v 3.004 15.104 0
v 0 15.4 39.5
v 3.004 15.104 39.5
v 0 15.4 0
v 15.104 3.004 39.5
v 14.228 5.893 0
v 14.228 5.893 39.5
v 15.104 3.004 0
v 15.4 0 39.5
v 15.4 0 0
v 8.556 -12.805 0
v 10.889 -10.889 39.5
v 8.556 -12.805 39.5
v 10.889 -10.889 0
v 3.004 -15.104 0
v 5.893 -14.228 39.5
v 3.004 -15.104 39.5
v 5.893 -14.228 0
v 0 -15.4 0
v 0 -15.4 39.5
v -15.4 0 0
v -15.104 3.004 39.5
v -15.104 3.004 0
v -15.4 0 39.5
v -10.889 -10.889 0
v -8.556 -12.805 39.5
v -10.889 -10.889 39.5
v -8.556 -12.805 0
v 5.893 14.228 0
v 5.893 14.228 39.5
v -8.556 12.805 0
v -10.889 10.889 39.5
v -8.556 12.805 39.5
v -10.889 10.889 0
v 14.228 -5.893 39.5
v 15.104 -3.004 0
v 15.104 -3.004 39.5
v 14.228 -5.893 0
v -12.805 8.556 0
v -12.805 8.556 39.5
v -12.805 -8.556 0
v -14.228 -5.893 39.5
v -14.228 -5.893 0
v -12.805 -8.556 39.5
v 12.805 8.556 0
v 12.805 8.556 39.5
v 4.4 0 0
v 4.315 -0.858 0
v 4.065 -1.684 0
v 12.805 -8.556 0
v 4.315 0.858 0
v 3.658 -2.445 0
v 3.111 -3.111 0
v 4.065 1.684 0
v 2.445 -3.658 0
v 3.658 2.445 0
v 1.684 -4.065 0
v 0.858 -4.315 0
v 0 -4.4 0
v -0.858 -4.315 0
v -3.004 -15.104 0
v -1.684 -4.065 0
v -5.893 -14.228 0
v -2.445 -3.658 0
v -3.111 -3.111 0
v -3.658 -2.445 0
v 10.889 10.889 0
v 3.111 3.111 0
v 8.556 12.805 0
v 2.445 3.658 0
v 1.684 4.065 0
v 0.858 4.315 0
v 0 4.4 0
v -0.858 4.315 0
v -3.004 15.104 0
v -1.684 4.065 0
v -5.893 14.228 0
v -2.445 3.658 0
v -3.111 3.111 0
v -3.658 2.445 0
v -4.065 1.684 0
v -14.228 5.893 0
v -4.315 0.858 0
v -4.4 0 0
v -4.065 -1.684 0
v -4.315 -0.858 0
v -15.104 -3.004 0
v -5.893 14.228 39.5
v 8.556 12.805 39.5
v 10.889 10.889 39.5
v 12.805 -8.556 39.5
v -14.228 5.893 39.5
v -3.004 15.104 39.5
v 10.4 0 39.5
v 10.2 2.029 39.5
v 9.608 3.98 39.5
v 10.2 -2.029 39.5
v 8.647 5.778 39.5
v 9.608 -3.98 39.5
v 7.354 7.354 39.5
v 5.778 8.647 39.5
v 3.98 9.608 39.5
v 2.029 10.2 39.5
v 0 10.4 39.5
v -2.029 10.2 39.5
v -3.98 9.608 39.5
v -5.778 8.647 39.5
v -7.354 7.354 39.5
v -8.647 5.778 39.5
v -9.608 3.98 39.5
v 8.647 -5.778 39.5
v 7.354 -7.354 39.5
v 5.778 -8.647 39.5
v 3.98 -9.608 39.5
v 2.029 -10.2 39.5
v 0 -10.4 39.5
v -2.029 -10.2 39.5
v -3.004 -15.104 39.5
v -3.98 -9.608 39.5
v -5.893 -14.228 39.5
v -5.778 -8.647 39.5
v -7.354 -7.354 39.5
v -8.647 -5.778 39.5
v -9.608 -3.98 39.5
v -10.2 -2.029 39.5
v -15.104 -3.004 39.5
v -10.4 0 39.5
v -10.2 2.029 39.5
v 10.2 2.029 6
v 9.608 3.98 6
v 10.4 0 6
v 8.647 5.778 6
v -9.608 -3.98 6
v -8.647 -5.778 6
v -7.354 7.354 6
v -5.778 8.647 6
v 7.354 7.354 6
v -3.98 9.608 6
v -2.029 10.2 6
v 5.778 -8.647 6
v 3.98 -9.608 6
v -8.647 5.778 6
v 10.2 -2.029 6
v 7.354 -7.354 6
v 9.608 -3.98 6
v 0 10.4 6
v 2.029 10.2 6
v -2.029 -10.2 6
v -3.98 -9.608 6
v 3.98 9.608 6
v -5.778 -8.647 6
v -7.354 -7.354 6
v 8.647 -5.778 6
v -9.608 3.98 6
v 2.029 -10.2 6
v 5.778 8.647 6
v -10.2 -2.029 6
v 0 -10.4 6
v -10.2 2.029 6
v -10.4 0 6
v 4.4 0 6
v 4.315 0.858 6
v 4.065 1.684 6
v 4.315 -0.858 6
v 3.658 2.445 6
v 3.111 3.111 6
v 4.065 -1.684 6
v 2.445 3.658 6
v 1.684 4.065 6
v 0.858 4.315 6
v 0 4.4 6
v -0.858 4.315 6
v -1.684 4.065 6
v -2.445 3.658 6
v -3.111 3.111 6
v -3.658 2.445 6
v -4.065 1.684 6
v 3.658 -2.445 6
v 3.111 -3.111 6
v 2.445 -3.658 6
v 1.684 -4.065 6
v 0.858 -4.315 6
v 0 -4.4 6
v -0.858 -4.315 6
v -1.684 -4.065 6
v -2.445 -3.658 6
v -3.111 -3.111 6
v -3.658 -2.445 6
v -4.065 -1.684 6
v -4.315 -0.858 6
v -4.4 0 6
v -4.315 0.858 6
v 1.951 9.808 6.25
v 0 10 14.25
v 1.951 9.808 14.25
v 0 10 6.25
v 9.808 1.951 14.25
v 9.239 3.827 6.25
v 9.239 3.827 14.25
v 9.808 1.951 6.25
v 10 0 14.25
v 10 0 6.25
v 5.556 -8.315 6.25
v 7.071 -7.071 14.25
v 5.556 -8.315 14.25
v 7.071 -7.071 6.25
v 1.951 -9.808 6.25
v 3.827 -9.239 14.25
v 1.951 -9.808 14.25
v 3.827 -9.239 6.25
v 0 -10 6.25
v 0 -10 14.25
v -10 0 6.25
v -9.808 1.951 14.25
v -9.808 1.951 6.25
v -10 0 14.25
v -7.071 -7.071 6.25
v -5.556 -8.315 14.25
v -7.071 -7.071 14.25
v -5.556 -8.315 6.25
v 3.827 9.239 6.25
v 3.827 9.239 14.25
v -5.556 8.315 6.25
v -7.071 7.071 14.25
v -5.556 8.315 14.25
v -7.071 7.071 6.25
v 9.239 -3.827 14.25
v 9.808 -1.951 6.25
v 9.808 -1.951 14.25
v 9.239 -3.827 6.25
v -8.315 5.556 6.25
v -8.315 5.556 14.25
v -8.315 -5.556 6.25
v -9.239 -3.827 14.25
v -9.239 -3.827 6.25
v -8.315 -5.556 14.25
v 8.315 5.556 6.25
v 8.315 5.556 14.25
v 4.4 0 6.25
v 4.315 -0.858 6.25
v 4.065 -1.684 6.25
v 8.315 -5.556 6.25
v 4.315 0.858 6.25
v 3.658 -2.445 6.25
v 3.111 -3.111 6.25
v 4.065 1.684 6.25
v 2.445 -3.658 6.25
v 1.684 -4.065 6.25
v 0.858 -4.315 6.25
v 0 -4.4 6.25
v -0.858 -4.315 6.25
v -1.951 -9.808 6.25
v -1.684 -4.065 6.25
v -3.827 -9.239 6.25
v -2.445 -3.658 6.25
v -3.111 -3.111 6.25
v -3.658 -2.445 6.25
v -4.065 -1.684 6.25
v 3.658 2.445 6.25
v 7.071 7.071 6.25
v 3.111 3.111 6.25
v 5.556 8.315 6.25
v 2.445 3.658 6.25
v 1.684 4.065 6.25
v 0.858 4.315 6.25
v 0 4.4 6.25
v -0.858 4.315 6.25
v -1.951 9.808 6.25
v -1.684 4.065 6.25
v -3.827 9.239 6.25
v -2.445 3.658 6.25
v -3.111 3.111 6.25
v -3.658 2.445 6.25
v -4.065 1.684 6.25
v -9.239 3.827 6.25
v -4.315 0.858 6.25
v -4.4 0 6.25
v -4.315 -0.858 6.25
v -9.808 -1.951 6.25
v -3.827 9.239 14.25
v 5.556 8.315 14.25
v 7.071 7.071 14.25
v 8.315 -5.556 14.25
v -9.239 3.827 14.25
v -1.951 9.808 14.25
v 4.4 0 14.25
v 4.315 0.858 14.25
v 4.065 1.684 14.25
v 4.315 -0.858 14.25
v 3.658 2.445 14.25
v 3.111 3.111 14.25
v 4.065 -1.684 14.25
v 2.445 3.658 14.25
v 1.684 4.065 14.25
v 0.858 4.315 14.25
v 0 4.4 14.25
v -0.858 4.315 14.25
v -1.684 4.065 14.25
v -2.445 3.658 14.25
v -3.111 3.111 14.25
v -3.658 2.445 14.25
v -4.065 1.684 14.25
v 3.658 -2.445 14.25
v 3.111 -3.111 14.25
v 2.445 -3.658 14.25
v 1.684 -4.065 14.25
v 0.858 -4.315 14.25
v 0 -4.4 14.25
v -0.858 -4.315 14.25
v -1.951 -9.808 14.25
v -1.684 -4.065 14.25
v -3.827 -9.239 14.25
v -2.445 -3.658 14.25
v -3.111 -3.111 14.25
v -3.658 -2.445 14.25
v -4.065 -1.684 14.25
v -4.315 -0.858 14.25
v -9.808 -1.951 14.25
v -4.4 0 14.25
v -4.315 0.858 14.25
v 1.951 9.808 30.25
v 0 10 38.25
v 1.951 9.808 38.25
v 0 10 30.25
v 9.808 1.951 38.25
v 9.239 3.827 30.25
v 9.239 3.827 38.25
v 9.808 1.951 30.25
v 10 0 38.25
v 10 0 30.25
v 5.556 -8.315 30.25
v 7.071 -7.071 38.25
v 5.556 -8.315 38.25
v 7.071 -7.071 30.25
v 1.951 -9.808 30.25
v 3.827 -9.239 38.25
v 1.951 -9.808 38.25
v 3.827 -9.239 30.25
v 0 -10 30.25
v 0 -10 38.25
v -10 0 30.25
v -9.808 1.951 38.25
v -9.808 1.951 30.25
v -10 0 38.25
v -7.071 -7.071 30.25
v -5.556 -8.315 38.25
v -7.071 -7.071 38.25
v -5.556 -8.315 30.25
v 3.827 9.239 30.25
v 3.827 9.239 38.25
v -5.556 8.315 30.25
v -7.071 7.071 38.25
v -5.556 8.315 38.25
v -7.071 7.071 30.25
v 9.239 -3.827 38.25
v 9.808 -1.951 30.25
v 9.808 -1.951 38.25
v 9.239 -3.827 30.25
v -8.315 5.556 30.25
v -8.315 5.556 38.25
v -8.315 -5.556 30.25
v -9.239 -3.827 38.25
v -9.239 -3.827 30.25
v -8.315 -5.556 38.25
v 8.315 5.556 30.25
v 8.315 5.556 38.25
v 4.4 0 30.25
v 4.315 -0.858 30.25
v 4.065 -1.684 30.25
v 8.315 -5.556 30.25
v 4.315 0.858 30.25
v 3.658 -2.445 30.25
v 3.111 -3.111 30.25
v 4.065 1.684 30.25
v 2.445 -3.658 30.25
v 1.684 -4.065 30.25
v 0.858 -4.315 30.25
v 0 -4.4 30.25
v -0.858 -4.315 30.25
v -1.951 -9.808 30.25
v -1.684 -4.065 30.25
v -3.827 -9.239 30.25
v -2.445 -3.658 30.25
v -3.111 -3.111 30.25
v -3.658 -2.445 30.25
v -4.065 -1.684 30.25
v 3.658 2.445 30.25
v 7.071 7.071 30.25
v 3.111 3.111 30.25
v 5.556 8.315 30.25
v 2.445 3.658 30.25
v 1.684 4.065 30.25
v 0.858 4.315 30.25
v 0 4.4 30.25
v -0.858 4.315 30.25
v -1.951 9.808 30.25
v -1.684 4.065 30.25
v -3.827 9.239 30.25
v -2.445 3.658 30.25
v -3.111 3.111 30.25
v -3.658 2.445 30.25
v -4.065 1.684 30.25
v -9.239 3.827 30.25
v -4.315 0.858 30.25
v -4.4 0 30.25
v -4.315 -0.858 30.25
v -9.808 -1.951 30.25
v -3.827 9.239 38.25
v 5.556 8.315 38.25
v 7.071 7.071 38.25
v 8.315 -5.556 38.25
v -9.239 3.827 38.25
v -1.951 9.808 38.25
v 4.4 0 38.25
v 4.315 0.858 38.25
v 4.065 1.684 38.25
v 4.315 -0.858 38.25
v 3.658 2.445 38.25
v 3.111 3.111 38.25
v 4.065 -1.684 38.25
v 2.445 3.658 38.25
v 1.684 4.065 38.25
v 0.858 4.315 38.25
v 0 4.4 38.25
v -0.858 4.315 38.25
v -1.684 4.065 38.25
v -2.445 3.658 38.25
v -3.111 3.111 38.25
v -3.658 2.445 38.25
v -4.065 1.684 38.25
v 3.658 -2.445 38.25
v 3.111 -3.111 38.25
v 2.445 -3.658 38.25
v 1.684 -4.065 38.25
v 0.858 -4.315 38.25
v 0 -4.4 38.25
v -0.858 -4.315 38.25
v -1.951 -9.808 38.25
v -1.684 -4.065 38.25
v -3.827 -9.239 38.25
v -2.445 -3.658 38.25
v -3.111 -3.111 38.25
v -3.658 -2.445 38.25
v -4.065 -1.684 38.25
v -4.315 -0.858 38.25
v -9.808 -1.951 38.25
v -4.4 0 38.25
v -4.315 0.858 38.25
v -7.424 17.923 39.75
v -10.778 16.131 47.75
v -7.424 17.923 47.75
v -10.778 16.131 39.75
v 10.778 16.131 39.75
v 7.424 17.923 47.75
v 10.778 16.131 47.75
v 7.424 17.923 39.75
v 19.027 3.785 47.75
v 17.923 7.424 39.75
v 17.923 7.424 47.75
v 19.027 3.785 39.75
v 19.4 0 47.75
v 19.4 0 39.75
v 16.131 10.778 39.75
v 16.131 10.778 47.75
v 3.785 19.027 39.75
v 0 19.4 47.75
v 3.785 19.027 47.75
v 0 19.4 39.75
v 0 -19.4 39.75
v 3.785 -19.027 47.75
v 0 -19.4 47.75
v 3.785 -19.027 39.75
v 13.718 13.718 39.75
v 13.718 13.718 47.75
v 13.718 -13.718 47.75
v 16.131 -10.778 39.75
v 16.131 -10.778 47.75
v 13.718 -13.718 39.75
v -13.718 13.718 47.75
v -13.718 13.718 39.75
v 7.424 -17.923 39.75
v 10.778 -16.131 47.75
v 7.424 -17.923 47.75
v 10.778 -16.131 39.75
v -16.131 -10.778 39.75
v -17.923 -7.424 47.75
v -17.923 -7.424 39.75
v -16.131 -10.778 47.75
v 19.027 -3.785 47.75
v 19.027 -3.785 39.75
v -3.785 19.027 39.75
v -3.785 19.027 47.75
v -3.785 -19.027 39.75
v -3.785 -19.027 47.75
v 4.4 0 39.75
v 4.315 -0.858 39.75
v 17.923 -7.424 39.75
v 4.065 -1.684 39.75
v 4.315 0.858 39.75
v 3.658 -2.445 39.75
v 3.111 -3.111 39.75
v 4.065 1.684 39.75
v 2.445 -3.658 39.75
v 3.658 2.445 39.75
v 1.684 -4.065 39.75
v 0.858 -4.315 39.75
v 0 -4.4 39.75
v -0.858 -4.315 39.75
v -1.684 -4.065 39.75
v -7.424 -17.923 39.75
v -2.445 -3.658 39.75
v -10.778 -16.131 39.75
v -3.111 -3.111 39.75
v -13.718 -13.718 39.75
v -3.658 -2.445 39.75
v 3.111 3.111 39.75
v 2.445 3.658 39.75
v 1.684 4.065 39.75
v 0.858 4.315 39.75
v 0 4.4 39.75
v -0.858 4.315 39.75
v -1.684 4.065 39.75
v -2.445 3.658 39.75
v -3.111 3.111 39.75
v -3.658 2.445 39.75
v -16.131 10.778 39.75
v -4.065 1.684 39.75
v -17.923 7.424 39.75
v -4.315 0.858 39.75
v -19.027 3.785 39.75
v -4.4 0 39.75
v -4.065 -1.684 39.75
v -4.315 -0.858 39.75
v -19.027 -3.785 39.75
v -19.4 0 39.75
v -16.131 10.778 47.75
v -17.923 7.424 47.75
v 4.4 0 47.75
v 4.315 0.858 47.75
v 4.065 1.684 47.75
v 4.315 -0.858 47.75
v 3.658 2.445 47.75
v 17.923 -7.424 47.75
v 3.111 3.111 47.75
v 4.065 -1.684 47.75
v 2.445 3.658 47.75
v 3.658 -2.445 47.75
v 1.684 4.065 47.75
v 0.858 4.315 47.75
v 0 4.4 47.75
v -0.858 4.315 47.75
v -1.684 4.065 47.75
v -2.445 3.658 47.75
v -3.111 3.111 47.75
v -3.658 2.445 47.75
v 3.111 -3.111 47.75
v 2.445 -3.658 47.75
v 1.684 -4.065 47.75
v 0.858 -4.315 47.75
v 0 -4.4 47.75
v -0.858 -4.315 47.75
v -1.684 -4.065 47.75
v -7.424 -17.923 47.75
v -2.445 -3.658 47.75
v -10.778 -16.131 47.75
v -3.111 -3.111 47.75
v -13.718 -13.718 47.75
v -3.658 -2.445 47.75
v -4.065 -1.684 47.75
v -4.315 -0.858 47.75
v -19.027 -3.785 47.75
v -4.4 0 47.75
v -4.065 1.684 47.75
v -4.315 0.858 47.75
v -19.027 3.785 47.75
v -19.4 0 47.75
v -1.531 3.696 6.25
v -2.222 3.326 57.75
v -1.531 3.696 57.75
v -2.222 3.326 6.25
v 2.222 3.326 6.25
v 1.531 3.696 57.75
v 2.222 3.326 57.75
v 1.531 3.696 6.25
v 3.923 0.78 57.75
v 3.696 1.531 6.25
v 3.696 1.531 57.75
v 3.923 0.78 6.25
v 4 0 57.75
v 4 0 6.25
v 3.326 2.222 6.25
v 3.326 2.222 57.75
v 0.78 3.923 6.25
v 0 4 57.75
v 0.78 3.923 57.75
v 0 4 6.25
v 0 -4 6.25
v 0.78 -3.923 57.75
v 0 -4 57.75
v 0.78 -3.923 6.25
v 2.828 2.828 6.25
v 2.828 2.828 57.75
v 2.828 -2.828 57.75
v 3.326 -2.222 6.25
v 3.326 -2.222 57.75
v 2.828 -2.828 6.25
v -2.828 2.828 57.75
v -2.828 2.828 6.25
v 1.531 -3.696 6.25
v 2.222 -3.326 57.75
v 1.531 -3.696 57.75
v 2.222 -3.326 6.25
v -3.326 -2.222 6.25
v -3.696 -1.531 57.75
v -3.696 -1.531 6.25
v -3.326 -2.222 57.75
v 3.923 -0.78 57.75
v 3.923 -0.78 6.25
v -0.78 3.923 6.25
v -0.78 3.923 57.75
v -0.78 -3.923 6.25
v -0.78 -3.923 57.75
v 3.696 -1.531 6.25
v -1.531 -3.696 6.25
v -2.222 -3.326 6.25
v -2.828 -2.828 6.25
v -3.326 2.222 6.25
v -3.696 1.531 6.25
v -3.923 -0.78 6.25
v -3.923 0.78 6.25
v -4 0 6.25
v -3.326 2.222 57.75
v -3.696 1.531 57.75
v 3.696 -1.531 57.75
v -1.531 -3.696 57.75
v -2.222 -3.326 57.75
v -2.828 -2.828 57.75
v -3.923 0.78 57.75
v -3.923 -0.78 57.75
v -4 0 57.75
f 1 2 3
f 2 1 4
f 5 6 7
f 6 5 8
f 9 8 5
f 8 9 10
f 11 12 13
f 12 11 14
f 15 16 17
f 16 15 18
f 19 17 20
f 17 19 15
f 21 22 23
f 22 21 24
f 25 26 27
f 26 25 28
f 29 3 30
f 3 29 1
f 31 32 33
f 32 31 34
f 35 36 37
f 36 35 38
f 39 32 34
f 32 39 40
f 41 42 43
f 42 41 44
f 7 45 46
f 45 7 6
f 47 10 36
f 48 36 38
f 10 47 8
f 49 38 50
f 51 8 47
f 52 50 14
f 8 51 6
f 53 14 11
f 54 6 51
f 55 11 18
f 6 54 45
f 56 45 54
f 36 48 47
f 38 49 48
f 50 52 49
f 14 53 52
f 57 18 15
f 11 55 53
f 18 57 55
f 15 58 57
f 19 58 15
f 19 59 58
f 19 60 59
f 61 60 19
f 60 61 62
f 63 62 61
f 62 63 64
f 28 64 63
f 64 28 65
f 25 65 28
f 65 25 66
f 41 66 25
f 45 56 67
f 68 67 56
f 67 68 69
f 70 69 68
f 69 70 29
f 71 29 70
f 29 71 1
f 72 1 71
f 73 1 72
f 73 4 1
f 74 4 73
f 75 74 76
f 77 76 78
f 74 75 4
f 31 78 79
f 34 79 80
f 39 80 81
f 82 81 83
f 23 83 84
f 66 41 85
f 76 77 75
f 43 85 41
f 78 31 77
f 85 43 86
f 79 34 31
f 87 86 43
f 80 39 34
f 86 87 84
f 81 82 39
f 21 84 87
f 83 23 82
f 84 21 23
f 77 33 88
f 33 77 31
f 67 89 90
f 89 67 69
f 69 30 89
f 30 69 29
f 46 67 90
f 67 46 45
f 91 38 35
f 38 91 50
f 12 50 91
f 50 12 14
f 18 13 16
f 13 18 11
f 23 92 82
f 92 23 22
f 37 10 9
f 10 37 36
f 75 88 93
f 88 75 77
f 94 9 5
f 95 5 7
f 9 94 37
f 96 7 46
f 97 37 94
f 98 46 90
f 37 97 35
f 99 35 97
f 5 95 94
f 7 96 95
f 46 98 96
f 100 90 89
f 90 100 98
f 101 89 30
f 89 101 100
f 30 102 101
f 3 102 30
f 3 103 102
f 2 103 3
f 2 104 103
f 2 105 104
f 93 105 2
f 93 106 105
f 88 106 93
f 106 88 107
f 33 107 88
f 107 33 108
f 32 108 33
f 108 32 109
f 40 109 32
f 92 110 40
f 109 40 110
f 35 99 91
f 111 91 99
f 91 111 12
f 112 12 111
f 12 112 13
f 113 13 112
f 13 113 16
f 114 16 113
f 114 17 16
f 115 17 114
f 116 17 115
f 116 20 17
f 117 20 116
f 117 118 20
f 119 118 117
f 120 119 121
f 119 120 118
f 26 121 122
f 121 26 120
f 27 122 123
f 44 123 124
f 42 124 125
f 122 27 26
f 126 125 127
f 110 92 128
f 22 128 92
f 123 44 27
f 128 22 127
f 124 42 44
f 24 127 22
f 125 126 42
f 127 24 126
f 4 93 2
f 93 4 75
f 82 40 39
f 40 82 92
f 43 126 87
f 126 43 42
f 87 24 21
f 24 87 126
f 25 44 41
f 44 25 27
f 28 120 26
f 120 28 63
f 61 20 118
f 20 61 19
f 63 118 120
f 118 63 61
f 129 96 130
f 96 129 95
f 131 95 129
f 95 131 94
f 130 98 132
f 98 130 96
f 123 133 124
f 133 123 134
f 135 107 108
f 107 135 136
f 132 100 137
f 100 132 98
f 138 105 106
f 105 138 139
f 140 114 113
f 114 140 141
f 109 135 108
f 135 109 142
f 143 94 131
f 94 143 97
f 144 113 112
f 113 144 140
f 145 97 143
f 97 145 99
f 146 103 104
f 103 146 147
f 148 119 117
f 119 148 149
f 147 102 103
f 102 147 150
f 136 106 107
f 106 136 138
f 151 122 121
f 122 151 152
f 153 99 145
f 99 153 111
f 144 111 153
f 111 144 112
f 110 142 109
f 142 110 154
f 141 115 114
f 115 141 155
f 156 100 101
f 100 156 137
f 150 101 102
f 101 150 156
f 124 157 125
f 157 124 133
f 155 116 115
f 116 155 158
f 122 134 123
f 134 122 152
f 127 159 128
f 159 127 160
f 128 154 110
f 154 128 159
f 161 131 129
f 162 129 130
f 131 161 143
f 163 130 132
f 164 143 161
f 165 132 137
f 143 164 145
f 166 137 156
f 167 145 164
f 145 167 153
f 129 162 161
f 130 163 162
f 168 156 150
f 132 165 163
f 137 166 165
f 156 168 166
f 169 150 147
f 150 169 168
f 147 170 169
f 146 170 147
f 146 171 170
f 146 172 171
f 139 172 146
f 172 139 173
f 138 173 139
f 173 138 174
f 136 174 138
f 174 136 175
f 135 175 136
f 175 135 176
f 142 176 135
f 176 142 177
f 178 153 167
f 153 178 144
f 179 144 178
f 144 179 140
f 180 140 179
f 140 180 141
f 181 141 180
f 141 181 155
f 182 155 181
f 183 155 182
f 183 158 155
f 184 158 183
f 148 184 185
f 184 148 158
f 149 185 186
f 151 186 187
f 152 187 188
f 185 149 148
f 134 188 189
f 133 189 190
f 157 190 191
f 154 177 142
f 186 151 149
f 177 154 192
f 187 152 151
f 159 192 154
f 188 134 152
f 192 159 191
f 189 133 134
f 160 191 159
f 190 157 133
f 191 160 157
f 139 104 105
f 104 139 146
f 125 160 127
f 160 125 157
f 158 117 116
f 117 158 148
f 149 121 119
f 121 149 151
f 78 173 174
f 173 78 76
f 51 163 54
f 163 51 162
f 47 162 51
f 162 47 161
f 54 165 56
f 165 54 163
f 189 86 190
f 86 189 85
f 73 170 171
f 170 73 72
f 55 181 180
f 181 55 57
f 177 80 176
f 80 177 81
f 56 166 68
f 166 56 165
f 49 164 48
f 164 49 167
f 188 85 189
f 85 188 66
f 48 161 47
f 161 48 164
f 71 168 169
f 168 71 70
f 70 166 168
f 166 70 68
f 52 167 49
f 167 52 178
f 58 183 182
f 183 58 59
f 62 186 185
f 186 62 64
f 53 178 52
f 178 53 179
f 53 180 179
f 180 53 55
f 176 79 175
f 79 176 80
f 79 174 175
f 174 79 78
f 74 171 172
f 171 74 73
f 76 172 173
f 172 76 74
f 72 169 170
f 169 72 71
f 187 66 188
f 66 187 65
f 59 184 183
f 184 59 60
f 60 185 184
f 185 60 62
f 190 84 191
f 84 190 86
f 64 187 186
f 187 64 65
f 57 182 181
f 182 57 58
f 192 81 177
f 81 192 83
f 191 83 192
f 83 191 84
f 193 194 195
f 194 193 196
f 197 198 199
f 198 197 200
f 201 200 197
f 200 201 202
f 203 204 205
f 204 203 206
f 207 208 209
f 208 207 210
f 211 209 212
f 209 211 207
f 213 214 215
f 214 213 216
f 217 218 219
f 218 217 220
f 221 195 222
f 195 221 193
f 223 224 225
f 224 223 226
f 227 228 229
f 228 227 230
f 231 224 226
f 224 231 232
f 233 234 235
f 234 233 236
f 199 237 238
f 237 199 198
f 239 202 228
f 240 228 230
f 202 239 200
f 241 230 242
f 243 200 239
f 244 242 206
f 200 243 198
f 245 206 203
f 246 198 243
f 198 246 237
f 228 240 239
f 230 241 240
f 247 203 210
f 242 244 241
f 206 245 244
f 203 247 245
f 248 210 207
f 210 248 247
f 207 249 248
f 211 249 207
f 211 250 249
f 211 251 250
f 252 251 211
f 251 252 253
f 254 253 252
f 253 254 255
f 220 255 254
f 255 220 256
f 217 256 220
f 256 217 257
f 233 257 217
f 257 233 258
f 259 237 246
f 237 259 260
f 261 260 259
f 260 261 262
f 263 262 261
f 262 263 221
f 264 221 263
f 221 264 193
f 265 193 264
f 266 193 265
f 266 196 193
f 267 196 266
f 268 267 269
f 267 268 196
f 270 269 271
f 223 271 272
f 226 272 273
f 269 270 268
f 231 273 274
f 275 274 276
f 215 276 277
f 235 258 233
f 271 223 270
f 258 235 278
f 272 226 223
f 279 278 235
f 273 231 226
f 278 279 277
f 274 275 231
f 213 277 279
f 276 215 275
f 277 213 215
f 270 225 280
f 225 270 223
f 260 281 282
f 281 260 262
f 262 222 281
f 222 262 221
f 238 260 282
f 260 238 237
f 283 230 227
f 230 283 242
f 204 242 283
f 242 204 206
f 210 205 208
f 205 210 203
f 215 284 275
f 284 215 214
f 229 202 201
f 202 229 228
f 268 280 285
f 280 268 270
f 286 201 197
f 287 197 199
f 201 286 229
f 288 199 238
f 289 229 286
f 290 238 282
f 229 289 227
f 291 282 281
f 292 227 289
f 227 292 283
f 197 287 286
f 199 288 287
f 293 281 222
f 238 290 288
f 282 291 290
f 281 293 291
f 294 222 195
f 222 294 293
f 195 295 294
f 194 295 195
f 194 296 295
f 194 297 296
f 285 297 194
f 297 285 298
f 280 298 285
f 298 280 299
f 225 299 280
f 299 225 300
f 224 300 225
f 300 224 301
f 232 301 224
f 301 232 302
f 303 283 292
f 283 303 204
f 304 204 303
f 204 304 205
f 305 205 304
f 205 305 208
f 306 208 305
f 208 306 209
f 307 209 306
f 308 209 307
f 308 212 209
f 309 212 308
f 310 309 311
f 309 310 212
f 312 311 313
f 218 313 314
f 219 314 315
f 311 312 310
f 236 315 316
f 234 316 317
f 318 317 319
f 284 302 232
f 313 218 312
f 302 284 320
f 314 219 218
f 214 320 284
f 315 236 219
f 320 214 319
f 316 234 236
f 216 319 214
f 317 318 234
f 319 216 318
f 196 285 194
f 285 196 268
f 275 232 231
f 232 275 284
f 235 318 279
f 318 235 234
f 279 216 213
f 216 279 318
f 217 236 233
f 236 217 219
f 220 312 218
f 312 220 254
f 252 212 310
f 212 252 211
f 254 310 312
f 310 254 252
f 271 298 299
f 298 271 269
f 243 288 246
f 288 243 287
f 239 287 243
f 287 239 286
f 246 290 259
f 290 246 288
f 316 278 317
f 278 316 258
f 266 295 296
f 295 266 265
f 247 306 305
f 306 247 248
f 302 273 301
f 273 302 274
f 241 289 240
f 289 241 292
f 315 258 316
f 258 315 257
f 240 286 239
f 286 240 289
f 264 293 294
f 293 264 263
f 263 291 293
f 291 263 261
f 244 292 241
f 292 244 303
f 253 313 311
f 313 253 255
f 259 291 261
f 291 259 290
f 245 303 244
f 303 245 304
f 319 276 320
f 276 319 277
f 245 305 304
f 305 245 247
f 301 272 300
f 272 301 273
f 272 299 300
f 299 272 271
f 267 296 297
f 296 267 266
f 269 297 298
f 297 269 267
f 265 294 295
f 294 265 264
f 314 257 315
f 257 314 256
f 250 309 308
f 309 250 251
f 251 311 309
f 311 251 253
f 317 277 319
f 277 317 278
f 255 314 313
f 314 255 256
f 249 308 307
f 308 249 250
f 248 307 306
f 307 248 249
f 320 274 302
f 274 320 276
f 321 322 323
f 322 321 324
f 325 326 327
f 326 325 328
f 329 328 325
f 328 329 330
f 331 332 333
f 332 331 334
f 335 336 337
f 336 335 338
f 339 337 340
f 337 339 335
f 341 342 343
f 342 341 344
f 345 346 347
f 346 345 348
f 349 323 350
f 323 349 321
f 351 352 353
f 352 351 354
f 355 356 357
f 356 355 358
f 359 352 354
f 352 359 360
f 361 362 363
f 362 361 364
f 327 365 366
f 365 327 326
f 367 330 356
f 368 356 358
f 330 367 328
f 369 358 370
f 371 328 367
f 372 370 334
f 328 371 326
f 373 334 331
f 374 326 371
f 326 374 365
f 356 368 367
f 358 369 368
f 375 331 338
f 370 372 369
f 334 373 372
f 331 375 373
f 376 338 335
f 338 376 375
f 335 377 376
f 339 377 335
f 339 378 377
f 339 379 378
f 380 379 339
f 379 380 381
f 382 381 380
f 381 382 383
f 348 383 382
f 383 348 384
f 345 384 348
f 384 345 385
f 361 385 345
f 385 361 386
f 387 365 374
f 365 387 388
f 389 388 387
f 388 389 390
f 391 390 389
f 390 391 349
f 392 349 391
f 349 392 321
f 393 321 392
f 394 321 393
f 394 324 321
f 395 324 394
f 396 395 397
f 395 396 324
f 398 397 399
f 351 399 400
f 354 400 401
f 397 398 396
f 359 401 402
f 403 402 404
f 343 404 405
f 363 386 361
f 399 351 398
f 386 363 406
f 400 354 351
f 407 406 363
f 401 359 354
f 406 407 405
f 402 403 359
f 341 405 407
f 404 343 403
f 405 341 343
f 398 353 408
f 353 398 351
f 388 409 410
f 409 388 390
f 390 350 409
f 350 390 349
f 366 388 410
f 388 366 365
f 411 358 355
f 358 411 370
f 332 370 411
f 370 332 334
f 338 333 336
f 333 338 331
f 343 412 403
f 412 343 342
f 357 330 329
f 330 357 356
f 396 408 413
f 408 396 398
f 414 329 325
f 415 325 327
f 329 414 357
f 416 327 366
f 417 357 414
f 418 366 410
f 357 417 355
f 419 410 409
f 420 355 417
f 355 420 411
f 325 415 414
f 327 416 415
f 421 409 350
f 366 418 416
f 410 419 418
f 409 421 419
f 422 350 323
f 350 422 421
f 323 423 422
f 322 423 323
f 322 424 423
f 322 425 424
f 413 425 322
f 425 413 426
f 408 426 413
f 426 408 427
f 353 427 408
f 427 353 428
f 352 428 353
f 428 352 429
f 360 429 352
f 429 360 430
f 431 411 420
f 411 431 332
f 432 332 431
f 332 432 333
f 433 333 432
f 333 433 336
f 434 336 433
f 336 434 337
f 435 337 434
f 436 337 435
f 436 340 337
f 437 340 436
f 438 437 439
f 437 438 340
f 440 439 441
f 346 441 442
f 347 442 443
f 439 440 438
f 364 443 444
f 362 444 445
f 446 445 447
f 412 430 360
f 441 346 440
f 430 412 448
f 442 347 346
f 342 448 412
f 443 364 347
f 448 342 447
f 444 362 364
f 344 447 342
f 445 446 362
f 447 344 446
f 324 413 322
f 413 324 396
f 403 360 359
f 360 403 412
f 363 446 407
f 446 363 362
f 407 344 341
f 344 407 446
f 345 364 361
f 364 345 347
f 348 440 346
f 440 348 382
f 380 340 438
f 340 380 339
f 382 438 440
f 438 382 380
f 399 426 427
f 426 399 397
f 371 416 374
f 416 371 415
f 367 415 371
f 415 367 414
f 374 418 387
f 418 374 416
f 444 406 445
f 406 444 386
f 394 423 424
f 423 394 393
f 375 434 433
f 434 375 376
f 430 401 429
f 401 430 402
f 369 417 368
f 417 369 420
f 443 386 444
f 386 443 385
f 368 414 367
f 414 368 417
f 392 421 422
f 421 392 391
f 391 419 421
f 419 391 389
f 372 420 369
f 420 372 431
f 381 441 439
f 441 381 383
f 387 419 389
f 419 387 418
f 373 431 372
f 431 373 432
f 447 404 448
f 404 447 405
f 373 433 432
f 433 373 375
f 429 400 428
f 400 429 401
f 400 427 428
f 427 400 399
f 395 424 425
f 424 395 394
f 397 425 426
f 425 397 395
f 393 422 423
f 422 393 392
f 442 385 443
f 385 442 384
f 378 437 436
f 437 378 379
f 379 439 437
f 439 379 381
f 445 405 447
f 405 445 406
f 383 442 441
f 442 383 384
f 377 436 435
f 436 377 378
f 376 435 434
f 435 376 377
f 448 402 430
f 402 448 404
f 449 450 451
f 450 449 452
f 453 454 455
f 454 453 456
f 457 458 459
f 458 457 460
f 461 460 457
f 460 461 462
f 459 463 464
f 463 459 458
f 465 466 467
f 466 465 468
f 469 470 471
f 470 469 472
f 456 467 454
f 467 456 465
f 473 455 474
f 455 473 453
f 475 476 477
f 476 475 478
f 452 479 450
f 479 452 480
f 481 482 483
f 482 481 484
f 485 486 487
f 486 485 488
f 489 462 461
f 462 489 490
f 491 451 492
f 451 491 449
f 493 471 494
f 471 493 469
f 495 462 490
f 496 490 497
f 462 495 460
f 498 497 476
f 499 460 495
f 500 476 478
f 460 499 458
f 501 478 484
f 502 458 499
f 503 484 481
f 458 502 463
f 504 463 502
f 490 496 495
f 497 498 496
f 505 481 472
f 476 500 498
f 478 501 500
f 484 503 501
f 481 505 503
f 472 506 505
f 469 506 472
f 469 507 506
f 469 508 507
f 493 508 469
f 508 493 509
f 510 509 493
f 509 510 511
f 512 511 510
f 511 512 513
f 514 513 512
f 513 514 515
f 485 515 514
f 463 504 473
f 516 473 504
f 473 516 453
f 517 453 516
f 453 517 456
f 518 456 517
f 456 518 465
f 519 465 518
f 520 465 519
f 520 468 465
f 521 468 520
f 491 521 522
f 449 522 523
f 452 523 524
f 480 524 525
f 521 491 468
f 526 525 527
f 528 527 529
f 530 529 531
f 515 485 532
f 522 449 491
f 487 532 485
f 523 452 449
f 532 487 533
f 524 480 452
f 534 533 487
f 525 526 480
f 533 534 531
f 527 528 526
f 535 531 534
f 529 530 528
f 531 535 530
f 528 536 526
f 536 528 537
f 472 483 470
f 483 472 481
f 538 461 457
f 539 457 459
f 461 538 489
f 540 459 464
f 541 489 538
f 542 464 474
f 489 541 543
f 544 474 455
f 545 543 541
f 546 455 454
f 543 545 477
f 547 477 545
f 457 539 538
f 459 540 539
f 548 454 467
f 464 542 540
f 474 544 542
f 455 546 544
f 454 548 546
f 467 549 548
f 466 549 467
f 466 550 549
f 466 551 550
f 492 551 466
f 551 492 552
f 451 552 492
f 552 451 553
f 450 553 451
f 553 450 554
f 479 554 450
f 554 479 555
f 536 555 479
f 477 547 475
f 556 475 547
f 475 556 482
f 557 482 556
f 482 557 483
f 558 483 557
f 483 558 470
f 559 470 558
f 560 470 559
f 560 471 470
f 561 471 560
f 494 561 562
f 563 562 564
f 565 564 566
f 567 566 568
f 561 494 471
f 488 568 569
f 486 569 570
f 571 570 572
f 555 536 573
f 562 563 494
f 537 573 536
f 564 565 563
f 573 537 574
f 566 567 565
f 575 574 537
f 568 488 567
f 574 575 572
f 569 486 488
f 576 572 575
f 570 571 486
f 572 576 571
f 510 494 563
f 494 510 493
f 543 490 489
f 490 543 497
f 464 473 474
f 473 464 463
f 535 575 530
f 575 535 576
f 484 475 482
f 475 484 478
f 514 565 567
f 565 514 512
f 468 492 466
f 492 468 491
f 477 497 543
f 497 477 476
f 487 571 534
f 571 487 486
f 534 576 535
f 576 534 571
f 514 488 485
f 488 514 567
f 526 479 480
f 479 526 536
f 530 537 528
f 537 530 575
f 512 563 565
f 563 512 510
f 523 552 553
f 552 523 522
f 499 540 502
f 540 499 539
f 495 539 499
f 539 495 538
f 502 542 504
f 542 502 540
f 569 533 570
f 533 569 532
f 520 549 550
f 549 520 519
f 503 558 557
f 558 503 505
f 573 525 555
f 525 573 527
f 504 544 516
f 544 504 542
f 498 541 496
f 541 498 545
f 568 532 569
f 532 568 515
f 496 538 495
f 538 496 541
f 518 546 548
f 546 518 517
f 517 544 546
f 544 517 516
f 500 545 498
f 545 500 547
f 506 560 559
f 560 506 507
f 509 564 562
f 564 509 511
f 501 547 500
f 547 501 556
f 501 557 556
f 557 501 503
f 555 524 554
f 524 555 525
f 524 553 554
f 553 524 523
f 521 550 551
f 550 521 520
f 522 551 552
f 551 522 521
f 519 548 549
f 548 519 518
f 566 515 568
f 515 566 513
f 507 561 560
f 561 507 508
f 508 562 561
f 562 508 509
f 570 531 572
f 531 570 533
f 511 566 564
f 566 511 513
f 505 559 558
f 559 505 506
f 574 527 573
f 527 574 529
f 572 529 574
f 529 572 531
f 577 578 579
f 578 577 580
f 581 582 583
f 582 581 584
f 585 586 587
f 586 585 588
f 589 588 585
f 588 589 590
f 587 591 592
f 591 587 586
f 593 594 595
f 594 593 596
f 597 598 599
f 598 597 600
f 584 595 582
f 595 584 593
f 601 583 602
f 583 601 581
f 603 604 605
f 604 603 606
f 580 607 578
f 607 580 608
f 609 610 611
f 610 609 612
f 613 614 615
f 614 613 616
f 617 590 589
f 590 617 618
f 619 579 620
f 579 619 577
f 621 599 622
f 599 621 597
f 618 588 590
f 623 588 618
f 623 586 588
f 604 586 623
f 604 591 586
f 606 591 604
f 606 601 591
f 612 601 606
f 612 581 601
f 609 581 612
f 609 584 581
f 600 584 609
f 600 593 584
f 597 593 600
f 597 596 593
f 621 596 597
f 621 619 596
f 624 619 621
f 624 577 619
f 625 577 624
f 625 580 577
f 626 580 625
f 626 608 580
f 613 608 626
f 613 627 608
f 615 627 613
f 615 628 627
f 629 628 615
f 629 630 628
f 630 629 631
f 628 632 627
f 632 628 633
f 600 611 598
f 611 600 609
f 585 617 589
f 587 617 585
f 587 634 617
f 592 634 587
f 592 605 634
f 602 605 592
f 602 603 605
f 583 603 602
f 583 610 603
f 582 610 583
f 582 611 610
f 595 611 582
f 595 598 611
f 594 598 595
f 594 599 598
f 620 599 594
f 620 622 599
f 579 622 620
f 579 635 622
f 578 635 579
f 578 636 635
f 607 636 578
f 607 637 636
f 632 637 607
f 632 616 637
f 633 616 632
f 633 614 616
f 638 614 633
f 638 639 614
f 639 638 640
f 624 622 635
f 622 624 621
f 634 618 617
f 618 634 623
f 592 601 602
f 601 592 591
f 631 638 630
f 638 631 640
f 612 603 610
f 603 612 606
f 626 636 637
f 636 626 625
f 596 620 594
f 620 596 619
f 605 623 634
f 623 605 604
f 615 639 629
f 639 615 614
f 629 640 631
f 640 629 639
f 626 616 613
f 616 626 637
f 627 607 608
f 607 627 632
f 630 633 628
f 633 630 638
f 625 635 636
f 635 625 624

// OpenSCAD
$fn = 32;

// ------------------------------------------------------------------------
// Shaft station: cup d30.8 x 39.5 mm, shaft d8
// Every part is its own module, assembly() places every instance.
// ------------------------------------------------------------------------

// --- part 1 ---
module housing_cup() {
  difference() {
    cylinder(h = 39.5, d = 30.8);
    translate([0, 0, 6]) cylinder(h = 34.5, d = 20.8);
    translate([0, 0, -1]) cylinder(h = 8, d = 8.8);
  }
}

// --- part 2 ---
module bearing_lower() {
  difference() {
      translate([0, 0, 0]) cylinder(h = 8, d = 20);
      translate([0, 0, -1]) cylinder(h = 10, d = 8.8);
    }
}

// --- part 3 ---
module bearing_upper() {
  difference() {
      translate([0, 0, 0]) cylinder(h = 8, d = 20);
      translate([0, 0, -1]) cylinder(h = 10, d = 8.8);
    }
}

// --- part 4 ---
module station_shaft() {
  translate([0, 0, -25.75]) cylinder(h = 51.5, d = 8);
}

// --- part 5 ---
module station_cover() {
  difference() {
    cylinder(h = 8, d = 38.8);
    translate([0, 0, -1]) cylinder(h = 10, d = 8.8);
  }
}

// --- assembly ---
module assembly() {
  color([0.80, 0.24, 0.20]) translate([0, 0, 0]) rotate([0, 0, 0]) housing_cup();
  color([0.20, 0.45, 0.75]) translate([0, 0, 6.25]) rotate([0, 0, 0]) bearing_lower();
  color([0.25, 0.62, 0.32]) translate([0, 0, 30.25]) rotate([0, 0, 0]) bearing_upper();
  color([0.92, 0.70, 0.18]) translate([0, 0, 32]) rotate([0, 0, 0]) station_shaft();
  color([0.58, 0.35, 0.70]) translate([0, 0, 39.75]) rotate([0, 0, 0]) station_cover();
}

assembly();
